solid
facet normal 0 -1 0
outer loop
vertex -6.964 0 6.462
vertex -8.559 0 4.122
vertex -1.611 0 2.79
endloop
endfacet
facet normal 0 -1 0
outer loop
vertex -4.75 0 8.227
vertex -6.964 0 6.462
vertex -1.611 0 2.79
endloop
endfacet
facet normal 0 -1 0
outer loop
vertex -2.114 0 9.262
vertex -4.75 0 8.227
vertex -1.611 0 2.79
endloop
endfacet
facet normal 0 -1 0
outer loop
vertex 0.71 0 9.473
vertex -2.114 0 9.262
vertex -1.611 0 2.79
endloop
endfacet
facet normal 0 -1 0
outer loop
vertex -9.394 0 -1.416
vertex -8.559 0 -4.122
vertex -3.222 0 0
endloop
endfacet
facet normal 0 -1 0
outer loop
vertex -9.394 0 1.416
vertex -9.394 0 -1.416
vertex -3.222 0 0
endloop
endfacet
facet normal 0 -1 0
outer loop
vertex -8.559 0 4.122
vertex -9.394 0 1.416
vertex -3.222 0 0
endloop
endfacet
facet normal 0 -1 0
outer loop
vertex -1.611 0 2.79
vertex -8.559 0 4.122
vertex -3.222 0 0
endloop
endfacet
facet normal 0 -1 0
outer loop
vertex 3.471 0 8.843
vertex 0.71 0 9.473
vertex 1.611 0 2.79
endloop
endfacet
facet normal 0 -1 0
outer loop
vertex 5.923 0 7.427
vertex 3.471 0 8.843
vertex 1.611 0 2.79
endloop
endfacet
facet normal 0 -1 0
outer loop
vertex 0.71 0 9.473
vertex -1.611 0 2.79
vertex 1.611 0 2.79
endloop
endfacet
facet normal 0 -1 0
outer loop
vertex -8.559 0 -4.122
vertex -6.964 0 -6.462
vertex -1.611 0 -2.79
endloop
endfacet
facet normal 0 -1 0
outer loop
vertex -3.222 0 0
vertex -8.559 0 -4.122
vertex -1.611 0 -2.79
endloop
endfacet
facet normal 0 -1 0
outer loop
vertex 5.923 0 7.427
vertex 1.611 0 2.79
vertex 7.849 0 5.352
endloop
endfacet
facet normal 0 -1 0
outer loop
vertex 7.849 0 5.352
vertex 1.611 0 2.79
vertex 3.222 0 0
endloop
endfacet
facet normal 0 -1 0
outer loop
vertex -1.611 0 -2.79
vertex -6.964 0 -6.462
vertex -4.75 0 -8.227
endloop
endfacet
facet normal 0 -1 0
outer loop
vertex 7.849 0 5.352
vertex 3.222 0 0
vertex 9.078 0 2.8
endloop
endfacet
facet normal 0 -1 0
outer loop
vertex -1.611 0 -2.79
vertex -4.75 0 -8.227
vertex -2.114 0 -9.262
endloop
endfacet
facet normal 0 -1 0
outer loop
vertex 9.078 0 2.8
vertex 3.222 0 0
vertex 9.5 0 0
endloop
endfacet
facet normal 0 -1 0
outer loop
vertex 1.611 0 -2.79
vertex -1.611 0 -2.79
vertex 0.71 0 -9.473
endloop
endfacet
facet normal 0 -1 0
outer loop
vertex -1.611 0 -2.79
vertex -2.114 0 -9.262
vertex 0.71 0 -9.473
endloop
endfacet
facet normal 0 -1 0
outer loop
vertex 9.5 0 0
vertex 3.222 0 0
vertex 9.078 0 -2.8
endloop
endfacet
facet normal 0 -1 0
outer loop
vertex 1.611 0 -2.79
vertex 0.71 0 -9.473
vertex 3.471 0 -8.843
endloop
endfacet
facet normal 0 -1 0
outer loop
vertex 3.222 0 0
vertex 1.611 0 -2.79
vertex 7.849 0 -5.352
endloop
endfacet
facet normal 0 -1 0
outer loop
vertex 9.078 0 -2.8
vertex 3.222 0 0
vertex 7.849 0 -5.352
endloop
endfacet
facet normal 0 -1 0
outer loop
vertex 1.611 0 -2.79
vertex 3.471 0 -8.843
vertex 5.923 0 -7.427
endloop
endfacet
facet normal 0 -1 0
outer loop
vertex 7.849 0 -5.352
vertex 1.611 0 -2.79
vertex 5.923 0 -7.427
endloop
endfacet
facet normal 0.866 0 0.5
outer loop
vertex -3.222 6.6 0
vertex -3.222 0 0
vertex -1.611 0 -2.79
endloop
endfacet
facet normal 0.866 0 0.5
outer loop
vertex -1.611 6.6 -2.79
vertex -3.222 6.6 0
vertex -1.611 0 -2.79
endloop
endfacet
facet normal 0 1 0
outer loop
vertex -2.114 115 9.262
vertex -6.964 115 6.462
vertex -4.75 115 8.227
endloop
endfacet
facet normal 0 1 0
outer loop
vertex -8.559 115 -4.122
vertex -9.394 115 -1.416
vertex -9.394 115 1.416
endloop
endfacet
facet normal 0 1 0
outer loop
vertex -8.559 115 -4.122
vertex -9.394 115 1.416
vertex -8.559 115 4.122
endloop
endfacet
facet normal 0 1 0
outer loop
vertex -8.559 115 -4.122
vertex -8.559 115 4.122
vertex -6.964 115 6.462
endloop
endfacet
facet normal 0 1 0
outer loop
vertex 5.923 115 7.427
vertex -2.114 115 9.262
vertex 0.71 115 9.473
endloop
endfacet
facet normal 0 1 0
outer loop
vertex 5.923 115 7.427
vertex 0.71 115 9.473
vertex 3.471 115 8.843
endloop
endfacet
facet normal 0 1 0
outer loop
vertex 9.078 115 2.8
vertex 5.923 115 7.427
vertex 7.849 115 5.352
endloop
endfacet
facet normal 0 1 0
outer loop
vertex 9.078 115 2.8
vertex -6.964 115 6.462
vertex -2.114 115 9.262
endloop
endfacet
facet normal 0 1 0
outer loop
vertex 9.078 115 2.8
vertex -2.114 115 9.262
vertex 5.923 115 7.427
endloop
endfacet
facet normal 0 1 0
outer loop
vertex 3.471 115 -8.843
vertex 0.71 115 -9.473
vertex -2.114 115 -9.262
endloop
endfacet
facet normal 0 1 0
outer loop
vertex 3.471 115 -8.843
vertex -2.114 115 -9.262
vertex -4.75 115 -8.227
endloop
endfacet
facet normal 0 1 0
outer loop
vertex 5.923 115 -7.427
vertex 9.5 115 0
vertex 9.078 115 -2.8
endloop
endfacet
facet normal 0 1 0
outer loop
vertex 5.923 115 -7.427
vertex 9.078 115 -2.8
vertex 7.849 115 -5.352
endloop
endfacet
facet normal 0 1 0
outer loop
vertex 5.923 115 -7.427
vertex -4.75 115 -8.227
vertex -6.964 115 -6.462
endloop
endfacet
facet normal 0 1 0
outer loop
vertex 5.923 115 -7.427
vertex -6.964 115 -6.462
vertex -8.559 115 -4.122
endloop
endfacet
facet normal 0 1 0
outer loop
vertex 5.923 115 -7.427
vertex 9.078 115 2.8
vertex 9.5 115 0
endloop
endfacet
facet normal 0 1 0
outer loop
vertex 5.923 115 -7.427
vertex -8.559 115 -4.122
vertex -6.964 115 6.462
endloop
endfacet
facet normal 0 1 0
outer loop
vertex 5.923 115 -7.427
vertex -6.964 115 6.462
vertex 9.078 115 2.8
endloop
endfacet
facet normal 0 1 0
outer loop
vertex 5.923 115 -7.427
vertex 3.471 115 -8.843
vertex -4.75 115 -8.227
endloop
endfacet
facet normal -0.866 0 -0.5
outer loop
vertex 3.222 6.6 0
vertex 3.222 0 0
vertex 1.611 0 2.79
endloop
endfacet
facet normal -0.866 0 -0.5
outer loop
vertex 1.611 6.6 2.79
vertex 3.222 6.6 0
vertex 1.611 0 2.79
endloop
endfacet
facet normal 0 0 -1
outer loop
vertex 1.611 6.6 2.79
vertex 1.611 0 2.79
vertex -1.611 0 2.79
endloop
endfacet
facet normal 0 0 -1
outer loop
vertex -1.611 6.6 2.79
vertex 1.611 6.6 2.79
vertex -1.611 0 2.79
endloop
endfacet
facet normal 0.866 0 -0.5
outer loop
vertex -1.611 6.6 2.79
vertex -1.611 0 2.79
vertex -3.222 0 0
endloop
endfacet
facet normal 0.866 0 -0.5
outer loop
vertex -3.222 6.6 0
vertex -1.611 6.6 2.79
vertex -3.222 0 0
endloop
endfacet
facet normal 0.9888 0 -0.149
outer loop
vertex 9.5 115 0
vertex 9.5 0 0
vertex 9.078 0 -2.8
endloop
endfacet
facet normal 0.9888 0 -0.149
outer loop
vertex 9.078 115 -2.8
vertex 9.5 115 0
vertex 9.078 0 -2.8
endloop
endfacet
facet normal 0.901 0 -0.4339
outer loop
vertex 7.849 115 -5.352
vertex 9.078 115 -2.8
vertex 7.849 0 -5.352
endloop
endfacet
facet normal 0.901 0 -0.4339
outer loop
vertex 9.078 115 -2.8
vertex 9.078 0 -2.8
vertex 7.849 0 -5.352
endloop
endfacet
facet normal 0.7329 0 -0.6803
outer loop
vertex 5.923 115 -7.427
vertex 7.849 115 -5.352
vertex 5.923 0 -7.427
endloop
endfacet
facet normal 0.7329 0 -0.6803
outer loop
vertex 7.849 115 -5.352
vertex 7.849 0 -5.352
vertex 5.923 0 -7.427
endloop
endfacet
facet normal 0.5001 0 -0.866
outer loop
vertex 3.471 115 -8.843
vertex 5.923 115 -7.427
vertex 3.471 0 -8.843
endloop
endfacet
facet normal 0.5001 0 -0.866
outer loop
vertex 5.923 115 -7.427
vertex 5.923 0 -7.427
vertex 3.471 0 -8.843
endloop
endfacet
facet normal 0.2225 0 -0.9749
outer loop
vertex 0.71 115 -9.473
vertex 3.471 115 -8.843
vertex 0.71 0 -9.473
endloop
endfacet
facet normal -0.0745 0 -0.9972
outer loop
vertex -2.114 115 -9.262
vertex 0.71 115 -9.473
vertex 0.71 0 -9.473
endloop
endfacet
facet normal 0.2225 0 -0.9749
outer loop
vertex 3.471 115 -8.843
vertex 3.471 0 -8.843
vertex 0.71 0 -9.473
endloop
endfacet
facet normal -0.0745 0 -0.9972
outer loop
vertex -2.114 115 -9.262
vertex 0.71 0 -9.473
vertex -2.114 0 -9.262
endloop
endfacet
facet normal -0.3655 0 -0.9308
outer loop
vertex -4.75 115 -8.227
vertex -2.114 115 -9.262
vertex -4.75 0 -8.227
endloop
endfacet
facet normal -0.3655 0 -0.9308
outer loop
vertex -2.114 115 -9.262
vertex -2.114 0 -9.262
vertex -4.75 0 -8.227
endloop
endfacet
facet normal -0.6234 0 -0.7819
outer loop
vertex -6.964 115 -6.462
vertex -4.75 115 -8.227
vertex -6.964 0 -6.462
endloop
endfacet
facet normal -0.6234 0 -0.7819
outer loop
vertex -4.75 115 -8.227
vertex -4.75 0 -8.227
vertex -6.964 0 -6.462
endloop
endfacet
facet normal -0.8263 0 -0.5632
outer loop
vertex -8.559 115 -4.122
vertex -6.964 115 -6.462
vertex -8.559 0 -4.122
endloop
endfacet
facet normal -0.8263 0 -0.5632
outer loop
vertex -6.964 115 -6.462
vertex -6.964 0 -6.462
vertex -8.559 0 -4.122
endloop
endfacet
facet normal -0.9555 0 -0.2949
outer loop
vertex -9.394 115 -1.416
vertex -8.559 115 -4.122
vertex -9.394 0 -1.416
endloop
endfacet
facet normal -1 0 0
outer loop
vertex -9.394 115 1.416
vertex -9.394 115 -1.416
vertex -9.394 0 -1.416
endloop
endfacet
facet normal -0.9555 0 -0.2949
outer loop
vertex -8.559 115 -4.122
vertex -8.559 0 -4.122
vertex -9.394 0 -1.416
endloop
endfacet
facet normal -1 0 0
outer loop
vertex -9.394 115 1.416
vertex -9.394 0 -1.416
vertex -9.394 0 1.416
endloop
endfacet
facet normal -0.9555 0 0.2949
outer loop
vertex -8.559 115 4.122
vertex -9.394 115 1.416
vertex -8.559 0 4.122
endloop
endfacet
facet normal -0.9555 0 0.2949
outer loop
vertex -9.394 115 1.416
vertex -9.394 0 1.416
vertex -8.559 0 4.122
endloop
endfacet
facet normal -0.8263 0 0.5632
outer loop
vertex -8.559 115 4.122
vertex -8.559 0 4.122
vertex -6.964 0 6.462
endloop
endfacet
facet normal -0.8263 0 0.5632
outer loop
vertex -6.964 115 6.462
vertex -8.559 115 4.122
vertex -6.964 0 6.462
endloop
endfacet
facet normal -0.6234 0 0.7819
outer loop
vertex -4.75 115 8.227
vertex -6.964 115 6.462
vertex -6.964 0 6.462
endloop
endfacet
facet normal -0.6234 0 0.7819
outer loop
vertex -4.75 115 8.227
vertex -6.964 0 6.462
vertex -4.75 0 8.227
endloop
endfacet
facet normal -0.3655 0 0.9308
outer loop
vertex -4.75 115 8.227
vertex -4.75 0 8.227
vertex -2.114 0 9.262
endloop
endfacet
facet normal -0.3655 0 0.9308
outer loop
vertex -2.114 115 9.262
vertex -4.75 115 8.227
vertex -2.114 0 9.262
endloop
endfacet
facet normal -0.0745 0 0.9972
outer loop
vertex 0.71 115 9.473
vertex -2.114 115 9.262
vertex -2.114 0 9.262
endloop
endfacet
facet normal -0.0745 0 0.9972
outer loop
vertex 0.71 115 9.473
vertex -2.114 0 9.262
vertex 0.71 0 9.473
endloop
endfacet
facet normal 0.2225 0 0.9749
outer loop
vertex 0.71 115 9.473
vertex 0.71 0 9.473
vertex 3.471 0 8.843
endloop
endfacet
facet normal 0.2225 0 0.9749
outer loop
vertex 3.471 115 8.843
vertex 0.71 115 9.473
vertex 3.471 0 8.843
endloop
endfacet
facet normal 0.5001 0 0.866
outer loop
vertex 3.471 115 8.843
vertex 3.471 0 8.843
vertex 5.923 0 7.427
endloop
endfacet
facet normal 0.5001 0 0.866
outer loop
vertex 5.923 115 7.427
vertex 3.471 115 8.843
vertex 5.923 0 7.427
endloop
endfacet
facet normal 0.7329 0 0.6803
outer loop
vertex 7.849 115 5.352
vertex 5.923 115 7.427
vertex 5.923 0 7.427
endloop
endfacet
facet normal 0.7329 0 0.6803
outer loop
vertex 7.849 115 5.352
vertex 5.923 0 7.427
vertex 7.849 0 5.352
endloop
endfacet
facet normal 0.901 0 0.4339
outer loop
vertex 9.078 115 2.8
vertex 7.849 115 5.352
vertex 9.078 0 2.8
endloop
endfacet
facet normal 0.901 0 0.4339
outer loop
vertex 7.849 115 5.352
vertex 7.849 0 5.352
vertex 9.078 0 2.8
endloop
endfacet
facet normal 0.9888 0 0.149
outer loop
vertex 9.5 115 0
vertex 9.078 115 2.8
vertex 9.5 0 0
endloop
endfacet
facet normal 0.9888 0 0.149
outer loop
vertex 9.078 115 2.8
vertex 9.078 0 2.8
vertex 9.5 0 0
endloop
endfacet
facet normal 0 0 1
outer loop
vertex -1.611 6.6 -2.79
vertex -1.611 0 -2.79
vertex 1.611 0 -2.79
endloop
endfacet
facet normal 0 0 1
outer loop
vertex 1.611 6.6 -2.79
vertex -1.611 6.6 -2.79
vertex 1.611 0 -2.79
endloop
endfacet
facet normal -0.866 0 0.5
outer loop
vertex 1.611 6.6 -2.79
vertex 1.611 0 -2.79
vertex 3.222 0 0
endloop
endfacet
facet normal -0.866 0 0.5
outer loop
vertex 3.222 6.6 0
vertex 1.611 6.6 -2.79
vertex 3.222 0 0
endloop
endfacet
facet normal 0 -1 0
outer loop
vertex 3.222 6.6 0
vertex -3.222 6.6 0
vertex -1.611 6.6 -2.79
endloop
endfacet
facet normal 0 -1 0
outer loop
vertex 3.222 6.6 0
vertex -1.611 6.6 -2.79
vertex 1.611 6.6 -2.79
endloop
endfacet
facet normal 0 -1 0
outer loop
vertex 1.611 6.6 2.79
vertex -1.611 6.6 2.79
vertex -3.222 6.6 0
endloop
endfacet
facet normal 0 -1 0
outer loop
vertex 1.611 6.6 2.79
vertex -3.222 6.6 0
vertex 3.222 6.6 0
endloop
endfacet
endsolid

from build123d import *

# Parameters (mm, degrees)
SKETCH1_R           = 9.5
BOSS_EXTRUDE1_DEPTH = 115
CUT_EXTRUDE1_DEPTH  = 6.6


with BuildPart() as part:
    # Sketch1 → Boss-Extrude1 (new body)
    with BuildSketch(Plane(origin=(0, 0, 0), x_dir=(1, 0, 0), z_dir=(0, 1, 0))):
        Circle(SKETCH1_R)
    extrude(amount=BOSS_EXTRUDE1_DEPTH)

    # Sketch2 → Cut-Extrude1 (cut)
    with BuildSketch(Plane.XZ):
        Polygon((1.610807251, 2.79), (-1.610807251, 2.79), (-3.221614502, 0), (-1.610807251, -2.79), (1.610807251, -2.79), (3.221614502, 0), align=None)
    extrude(amount=-CUT_EXTRUDE1_DEPTH, mode=Mode.SUBTRACT)


solid = part.part
